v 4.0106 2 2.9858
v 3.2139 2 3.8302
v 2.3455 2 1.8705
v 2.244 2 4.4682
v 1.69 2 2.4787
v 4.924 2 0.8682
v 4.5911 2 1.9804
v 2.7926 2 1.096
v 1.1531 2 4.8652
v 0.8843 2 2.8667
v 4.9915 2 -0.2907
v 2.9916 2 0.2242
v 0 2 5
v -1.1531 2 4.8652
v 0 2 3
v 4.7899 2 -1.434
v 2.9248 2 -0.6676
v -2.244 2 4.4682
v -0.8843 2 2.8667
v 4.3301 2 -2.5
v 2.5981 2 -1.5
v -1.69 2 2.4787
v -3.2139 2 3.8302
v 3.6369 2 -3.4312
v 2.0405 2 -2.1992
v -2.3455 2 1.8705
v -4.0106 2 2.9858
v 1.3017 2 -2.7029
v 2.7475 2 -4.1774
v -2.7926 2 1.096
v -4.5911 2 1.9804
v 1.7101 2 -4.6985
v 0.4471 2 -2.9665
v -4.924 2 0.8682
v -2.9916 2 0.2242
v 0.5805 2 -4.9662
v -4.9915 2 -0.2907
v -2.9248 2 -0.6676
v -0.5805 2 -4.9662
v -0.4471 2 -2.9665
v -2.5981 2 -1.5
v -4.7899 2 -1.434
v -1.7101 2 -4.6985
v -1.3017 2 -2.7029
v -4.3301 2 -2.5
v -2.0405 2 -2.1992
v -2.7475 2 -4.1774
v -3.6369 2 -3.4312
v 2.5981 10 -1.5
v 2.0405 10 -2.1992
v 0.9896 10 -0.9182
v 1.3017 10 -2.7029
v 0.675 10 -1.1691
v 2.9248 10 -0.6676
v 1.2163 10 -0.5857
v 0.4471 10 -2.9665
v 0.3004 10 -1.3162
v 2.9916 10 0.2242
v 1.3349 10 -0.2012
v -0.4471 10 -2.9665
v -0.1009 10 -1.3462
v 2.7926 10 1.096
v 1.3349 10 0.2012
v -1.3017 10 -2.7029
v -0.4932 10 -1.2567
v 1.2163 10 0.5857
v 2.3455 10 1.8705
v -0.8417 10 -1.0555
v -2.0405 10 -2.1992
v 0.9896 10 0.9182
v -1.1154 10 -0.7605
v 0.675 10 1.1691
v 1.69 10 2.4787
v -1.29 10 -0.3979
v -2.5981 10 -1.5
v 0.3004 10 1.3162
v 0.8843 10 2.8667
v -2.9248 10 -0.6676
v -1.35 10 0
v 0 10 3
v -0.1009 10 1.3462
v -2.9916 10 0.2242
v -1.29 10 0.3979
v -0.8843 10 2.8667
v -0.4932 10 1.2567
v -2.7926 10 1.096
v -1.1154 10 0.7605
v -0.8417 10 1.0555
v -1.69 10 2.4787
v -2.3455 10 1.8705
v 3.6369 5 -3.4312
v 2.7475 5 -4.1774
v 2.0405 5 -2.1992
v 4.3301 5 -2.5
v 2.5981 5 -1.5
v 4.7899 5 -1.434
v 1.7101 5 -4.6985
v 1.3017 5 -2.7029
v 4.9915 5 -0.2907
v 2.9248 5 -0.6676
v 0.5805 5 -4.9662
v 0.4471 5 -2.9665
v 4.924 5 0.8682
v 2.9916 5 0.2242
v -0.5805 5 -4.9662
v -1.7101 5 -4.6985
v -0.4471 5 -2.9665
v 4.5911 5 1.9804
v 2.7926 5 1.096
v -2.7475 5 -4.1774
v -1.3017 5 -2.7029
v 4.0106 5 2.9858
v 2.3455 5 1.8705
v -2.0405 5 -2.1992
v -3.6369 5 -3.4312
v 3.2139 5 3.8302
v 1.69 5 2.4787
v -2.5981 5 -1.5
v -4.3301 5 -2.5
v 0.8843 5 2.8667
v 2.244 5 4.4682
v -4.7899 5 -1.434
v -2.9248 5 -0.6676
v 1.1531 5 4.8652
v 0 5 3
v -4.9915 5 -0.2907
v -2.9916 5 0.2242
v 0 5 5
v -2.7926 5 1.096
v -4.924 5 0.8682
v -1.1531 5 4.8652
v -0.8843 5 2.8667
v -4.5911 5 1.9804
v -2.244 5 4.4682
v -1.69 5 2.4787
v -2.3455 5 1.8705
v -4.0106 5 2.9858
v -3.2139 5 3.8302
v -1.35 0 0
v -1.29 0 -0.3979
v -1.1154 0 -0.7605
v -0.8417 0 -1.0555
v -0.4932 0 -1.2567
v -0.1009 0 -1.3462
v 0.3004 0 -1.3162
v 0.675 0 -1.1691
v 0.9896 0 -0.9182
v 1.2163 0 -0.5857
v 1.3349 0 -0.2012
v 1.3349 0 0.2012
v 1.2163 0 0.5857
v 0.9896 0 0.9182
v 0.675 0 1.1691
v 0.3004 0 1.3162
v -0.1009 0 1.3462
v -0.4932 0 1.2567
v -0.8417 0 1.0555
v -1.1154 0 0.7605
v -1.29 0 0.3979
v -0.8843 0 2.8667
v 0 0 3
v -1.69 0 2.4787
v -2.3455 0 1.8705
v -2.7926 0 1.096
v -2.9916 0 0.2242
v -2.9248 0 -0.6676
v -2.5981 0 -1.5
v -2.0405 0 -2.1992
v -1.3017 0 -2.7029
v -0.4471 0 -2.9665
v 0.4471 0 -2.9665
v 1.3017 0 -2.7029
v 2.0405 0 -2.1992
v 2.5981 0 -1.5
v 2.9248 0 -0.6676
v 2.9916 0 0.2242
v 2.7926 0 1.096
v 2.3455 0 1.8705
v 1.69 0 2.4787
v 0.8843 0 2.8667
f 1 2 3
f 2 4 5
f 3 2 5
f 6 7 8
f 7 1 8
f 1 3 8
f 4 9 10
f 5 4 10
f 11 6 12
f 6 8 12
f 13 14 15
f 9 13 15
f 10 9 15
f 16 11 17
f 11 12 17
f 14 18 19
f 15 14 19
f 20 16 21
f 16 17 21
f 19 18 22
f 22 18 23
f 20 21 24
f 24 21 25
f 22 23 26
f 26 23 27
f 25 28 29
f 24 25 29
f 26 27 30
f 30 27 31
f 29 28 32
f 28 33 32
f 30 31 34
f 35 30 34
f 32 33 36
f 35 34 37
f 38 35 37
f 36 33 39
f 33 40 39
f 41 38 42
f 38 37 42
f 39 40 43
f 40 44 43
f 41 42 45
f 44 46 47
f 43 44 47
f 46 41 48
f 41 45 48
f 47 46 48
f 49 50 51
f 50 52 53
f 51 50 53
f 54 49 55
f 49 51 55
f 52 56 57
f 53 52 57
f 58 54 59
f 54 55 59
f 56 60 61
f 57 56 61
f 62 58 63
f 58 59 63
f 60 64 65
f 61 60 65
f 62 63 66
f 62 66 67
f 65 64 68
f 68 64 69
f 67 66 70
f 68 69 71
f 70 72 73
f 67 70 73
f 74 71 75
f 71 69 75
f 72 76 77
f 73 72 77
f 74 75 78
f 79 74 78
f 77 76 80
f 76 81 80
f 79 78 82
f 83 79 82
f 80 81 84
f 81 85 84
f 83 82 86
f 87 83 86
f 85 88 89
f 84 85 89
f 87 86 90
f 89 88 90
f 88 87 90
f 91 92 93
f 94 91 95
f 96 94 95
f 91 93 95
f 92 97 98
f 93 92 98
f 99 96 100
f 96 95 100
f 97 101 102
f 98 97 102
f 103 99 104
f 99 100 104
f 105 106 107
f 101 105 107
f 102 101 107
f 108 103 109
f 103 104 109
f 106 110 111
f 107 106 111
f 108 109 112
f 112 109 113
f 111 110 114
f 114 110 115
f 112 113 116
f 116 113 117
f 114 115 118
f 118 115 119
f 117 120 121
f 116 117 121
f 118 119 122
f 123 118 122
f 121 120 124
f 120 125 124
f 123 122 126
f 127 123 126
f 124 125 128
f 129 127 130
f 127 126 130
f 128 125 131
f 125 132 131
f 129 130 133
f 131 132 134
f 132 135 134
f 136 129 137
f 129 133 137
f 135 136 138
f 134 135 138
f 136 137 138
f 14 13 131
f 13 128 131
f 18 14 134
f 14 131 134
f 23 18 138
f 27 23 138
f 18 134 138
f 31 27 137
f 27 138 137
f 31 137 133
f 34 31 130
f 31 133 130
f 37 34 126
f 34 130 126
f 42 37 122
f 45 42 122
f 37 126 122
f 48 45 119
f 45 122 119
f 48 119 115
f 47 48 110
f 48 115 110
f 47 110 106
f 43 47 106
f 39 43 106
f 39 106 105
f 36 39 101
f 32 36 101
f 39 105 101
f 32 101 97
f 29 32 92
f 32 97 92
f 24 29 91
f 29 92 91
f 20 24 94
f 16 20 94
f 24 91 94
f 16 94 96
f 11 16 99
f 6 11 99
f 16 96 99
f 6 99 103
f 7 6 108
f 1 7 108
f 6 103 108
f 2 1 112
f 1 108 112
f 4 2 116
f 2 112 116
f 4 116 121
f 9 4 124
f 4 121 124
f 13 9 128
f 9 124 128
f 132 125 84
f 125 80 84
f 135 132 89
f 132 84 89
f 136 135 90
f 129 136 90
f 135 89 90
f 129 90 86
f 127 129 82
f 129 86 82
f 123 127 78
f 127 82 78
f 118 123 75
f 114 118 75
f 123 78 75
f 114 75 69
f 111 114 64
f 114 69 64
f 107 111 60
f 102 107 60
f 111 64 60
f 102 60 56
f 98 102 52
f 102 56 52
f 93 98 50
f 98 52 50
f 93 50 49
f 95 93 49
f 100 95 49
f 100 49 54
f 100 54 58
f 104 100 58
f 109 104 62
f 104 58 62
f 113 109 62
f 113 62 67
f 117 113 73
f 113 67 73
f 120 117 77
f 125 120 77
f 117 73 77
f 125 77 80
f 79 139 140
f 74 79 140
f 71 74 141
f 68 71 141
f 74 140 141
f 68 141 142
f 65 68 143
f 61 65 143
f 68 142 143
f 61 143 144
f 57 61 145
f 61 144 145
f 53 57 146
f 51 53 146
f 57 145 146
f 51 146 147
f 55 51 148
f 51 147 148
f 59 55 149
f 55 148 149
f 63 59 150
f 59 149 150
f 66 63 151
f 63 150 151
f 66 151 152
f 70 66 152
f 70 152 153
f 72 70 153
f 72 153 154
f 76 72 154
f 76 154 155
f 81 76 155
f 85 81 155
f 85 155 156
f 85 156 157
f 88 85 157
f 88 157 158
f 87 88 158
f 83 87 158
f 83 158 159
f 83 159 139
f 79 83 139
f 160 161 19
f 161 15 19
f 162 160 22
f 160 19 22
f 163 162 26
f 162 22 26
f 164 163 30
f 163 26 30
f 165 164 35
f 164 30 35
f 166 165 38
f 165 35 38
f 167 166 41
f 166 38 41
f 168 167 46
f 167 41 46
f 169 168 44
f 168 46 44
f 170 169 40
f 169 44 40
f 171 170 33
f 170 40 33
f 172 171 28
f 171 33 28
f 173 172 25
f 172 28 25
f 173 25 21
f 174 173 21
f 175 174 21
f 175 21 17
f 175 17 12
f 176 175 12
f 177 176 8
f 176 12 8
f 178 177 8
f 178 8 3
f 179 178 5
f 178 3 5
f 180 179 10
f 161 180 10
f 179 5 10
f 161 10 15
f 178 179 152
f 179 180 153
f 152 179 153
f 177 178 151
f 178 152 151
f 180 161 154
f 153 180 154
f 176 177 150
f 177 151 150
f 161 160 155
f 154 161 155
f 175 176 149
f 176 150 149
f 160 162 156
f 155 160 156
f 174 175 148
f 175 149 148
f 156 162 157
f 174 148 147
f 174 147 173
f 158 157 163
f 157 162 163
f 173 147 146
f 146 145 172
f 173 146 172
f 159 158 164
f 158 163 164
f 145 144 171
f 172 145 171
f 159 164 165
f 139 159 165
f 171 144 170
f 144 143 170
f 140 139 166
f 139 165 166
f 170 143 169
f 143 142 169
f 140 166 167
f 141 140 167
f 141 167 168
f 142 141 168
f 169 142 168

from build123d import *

# Parameters (mm, degrees)
HOLE_WIZARD_2_7_2_7_1_D = 2.7


with BuildPart() as part:
    # 草圖1 → 旋轉1 (revolve)
    with BuildSketch(Plane(origin=(0, 0, 0), x_dir=(0, 0, -1), z_dir=(1, 0, 0)), mode=Mode.PRIVATE) as revolve_1_sk:
        Polygon((0, 0), (3, 0), (3, 2), (5, 2), (5, 5), (3, 5), (3, 10), (0, 10), align=None)
    revolve(revolve_1_sk.sketch.rotate(Axis((0, 10, 0), (0, -1, 0)), 180), axis=Axis((0, 10, 0), (0, -1, 0)))

    # Ø2.7 (2.7) 直徑孔1 (through all)
    with Locations(Plane(origin=(0, 10, 0), x_dir=(1, 0, 0), z_dir=(0, 1, 0))):
        with Locations((0, 0)):
            Hole(HOLE_WIZARD_2_7_2_7_1_D / 2)


solid = part.part
